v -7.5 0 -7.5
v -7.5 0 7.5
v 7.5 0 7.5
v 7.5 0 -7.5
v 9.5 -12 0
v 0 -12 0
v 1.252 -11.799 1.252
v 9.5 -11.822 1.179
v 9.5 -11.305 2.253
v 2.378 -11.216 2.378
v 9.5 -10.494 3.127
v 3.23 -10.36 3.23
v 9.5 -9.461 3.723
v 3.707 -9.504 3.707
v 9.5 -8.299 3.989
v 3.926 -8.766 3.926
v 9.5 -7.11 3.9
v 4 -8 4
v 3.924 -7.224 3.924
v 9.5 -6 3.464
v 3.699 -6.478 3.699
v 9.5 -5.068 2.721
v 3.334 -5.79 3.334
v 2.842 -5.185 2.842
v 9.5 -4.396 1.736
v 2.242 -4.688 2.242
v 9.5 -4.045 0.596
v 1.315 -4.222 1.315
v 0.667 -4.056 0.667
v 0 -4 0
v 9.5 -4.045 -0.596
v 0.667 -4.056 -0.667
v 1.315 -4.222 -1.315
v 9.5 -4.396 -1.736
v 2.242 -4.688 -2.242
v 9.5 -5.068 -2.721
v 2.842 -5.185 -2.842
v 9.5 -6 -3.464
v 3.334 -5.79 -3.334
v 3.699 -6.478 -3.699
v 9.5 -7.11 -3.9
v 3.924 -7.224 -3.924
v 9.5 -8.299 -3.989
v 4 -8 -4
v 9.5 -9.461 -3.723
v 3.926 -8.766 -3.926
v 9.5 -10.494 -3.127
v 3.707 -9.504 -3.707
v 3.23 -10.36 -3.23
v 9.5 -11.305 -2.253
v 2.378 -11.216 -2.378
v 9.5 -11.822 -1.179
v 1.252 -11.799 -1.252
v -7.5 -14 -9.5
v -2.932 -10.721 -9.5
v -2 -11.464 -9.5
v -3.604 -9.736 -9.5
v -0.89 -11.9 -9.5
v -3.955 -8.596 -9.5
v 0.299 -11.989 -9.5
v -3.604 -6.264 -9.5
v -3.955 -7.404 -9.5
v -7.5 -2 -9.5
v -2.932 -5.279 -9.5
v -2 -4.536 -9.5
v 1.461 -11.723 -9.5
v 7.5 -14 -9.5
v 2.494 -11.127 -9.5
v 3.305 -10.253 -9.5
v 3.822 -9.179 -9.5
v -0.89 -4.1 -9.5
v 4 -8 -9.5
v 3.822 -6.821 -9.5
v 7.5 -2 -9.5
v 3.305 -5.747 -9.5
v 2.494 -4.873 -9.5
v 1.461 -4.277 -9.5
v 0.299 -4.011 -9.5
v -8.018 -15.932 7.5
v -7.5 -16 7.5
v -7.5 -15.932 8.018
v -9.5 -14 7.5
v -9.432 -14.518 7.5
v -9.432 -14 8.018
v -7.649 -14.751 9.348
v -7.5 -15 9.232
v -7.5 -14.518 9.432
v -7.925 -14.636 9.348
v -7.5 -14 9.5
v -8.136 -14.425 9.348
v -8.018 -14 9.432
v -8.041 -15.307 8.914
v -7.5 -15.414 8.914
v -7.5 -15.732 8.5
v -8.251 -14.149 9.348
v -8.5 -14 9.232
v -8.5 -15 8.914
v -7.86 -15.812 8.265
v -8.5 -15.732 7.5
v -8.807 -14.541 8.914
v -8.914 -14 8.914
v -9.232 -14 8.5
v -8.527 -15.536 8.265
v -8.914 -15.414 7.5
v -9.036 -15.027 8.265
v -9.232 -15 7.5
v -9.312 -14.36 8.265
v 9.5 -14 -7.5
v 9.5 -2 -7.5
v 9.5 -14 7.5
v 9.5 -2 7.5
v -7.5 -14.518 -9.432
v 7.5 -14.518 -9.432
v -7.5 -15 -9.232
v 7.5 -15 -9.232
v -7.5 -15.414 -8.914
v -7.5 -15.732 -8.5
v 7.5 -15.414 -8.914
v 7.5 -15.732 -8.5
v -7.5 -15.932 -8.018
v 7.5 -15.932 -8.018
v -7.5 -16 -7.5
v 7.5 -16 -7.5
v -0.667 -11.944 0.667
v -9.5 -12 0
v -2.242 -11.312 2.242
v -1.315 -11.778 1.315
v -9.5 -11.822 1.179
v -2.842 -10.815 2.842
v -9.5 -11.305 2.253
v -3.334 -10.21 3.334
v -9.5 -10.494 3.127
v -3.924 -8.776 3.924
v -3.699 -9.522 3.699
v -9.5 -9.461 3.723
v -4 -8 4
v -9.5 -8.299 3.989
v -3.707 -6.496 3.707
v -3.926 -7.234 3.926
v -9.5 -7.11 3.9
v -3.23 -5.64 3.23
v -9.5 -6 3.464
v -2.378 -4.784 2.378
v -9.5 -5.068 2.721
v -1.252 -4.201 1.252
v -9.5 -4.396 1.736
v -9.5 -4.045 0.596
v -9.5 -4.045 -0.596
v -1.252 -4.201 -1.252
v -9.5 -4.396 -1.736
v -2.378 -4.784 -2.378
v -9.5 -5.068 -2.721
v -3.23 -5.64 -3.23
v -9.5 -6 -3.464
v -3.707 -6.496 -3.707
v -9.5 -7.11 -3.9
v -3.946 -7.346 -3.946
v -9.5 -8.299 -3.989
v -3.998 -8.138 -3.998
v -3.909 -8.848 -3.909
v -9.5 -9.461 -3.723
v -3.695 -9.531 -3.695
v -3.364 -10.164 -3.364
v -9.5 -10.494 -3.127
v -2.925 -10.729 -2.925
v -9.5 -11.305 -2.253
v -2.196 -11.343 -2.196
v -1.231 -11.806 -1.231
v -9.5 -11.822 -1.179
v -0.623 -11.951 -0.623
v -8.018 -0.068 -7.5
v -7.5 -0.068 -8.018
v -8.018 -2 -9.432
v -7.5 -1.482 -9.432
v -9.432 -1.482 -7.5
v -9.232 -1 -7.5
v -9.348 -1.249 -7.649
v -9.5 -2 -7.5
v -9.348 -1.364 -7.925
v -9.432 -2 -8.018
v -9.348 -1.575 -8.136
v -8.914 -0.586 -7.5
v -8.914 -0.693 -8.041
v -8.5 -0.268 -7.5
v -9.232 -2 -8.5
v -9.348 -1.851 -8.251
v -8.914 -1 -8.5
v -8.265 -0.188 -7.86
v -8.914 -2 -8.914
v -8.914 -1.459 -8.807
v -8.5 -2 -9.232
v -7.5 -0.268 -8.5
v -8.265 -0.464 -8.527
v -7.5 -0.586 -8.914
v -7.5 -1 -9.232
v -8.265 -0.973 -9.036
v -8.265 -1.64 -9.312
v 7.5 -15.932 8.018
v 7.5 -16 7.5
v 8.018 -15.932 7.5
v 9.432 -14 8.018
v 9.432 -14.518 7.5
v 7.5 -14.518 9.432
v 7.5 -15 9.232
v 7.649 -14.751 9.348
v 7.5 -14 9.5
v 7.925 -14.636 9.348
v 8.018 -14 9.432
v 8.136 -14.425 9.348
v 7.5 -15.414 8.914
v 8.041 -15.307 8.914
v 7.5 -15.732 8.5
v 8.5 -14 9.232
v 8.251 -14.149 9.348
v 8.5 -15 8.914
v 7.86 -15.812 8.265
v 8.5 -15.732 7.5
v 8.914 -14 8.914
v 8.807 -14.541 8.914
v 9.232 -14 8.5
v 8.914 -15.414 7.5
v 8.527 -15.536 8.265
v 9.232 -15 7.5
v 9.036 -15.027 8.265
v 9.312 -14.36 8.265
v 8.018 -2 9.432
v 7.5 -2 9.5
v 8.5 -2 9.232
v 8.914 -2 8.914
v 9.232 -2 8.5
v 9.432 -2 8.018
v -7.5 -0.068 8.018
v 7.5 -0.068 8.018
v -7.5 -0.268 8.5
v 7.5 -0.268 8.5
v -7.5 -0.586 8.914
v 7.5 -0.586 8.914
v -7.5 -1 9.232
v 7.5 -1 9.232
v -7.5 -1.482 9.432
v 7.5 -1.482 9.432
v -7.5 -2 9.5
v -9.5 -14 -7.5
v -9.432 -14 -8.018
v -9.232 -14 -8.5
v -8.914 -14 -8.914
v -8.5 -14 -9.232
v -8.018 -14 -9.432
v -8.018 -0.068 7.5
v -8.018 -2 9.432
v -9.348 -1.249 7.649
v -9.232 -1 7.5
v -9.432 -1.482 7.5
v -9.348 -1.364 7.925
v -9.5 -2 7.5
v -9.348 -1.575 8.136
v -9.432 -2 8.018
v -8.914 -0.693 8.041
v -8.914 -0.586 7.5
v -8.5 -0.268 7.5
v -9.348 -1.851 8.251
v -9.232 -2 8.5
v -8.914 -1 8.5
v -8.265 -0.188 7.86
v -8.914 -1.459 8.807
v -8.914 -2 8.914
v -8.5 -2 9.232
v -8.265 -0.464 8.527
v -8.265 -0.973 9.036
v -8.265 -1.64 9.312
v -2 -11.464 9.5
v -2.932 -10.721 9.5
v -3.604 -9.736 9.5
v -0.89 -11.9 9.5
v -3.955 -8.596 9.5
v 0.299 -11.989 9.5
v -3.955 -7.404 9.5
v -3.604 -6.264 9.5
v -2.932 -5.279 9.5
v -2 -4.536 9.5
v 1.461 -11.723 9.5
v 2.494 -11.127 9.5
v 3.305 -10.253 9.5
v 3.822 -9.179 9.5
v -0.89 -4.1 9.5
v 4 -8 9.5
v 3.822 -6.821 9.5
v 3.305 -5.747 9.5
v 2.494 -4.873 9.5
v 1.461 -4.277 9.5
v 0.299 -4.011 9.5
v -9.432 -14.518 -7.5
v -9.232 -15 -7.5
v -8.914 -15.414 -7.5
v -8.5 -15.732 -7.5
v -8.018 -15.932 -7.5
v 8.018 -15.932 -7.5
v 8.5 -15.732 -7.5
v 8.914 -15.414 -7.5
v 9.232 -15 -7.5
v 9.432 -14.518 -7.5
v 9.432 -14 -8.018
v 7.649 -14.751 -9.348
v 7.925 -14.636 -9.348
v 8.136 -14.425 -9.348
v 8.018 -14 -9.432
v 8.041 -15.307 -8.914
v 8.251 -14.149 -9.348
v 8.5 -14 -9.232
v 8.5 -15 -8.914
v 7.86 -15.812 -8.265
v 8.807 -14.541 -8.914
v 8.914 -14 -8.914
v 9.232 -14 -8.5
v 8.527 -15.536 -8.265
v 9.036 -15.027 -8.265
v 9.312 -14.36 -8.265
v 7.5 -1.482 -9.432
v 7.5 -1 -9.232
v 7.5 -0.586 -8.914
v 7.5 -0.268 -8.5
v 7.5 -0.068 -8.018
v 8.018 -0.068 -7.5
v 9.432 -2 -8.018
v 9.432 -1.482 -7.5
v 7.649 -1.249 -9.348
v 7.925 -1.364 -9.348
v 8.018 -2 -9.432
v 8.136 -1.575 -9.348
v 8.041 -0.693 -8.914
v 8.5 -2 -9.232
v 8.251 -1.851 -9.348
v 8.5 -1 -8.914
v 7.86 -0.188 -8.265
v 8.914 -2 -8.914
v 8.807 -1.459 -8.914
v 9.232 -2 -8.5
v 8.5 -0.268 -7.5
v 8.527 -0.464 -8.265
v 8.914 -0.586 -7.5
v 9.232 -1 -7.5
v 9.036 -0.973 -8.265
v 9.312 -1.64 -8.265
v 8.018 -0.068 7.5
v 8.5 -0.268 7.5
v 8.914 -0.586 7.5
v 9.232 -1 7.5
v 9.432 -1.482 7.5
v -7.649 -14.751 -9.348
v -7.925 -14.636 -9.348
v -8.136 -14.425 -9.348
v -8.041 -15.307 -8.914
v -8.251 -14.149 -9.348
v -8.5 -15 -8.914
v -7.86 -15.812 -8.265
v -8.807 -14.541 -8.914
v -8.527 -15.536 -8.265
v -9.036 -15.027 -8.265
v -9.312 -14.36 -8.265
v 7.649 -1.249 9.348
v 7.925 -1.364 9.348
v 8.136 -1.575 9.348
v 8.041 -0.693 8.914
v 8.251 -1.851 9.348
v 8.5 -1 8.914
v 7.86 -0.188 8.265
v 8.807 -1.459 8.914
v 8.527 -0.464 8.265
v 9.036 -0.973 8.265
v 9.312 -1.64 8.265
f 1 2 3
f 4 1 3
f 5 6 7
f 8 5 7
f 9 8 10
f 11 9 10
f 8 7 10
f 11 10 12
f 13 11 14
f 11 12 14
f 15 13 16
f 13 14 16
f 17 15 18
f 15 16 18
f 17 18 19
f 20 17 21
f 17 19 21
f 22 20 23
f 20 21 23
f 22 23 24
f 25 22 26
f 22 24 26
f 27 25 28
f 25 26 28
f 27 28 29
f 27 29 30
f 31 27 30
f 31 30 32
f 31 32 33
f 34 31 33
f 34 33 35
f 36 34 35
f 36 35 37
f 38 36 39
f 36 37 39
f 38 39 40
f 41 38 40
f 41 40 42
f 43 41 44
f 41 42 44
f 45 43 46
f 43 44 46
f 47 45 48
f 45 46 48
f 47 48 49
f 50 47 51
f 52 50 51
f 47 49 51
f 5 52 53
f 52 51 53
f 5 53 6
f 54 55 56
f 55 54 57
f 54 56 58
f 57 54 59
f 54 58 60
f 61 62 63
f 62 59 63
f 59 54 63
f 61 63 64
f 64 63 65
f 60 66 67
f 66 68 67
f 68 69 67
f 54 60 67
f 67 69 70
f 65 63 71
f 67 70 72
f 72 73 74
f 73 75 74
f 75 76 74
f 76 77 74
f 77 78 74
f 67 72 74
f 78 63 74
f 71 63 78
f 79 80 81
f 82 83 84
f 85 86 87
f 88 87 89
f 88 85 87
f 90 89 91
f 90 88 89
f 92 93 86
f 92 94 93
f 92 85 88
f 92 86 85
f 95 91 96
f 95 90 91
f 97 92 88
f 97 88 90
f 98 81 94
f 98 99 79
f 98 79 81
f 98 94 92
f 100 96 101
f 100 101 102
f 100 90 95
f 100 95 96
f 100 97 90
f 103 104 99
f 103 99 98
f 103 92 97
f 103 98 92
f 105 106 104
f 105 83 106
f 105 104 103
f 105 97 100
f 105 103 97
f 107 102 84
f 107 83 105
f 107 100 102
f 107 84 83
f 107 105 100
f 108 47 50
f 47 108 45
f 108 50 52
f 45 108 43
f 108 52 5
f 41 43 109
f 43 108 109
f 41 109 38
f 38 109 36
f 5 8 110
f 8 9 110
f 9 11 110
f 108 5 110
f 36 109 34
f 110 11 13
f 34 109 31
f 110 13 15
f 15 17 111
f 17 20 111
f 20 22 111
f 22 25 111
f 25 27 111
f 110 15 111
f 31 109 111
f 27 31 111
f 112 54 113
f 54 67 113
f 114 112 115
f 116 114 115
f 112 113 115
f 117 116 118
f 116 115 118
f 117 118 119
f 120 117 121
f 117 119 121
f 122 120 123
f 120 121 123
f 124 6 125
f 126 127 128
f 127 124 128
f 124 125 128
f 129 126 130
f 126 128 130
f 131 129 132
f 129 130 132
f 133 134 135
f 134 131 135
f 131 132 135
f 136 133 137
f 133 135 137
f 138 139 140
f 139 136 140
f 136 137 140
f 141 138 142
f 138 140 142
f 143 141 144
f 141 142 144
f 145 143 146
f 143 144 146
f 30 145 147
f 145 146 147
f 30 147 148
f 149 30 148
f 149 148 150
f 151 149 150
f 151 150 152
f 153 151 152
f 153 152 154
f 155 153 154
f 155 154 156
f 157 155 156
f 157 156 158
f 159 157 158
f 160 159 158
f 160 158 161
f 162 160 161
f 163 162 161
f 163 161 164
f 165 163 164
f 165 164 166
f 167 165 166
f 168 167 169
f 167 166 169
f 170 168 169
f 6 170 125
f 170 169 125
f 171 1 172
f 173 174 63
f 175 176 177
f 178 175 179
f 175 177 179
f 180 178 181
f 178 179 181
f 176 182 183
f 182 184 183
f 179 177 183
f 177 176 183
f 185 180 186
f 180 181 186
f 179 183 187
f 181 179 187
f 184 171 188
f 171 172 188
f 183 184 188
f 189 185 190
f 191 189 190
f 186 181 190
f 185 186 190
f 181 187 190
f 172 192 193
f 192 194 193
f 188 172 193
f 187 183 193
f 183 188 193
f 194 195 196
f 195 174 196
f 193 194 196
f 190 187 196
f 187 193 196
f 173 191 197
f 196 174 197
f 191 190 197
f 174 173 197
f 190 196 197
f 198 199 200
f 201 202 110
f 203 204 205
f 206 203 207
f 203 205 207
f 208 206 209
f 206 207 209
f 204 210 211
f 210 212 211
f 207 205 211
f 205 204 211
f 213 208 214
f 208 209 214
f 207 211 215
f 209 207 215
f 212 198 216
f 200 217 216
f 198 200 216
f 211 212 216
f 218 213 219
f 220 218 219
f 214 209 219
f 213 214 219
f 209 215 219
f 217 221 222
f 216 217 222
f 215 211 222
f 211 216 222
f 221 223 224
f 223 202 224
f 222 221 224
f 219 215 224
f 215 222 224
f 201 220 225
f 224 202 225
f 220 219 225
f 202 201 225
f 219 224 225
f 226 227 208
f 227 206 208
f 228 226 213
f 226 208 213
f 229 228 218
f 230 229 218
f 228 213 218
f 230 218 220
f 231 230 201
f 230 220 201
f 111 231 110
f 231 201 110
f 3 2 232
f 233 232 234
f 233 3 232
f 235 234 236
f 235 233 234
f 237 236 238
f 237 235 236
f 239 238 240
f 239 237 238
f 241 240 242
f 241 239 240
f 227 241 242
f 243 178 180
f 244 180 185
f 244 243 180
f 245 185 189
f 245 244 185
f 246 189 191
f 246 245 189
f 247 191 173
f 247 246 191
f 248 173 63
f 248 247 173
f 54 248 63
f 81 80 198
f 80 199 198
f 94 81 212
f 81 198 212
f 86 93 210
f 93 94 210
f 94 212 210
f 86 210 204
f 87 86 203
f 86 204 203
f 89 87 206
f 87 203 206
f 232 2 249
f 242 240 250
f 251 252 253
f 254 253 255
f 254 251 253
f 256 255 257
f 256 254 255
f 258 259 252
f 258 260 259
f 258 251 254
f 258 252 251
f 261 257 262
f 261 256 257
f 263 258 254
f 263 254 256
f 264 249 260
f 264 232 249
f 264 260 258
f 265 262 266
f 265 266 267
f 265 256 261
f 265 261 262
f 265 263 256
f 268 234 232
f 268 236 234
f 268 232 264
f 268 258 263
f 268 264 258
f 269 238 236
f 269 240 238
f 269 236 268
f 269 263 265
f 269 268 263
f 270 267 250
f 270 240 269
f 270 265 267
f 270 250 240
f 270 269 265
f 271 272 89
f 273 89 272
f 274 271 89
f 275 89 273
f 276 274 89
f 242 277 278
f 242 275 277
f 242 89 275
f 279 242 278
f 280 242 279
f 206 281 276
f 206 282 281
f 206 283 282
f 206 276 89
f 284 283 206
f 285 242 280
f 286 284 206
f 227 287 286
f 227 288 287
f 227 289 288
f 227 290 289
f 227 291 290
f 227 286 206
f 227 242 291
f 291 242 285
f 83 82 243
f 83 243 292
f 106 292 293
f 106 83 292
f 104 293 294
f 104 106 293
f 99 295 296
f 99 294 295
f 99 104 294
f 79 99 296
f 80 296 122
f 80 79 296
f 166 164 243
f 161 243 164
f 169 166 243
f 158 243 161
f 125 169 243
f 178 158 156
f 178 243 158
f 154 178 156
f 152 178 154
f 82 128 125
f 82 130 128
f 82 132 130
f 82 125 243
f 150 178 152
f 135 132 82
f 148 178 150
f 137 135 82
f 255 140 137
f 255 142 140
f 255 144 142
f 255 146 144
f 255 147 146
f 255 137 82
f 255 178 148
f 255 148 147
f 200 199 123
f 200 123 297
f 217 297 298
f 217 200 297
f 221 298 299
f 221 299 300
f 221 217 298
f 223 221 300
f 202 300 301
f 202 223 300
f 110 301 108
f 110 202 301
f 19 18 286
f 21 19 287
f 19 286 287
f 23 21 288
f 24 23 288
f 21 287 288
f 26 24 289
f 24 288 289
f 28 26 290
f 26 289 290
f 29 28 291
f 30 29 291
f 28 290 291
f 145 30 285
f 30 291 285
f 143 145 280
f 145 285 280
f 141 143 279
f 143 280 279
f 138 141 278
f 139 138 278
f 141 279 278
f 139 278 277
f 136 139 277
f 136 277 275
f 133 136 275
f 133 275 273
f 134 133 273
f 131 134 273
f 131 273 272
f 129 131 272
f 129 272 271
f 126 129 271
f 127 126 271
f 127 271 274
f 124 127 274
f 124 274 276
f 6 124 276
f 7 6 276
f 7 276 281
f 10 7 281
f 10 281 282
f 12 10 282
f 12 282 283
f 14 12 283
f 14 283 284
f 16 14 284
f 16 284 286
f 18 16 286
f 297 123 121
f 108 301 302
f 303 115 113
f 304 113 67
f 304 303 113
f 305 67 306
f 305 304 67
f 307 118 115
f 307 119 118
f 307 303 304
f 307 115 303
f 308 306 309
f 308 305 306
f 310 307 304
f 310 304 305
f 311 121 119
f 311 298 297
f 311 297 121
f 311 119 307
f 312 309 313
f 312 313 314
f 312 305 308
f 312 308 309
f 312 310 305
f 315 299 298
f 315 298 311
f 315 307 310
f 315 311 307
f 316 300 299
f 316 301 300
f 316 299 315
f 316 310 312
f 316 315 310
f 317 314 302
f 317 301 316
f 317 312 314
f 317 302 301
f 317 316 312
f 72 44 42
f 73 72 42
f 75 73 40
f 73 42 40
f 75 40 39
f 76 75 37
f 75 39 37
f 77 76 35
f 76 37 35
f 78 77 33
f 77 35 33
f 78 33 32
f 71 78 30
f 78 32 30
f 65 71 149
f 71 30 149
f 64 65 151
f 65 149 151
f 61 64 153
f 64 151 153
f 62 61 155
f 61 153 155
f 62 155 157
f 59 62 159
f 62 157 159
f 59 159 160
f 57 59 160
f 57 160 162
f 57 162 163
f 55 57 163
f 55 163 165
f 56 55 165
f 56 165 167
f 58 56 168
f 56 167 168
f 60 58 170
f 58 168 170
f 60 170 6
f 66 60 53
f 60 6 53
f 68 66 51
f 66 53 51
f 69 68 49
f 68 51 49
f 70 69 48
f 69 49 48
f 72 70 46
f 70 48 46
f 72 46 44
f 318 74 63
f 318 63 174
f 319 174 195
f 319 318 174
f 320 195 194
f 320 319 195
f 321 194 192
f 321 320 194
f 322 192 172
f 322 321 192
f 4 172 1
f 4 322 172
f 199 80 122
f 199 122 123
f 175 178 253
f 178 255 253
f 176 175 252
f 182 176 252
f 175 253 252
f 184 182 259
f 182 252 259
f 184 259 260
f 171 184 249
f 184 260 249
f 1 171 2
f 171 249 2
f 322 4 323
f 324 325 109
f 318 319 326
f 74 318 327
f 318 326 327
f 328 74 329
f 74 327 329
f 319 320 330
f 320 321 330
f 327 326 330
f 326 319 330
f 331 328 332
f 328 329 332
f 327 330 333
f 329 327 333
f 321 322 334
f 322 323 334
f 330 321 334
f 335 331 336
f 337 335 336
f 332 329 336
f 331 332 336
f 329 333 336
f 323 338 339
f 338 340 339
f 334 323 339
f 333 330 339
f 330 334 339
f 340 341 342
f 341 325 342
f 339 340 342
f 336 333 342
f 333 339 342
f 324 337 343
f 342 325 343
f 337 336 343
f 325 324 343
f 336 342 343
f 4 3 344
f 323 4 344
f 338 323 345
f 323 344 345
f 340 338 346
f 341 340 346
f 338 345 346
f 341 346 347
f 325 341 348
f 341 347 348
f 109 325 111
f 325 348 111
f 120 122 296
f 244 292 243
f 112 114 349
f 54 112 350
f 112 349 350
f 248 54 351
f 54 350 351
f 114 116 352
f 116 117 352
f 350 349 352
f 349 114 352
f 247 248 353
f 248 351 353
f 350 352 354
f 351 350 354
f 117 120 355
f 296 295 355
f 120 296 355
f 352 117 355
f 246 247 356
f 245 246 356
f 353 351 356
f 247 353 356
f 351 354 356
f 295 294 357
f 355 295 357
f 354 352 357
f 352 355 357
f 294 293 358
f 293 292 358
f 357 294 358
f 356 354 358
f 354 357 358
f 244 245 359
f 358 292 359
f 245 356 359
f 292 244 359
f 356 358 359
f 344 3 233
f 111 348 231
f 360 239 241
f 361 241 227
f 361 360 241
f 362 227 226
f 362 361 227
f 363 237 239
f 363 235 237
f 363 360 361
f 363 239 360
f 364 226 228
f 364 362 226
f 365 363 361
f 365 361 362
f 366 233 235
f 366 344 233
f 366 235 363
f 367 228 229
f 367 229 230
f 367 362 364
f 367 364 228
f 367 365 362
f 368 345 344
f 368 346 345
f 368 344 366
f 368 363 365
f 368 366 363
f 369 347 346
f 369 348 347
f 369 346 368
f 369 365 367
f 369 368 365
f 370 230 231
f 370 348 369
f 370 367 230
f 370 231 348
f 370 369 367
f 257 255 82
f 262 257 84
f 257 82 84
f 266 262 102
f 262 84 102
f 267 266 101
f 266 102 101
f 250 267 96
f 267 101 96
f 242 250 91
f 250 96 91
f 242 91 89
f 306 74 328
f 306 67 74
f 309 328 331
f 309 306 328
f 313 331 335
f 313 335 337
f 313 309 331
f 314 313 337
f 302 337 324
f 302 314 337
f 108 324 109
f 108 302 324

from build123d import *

# Parameters (mm, degrees)
F0_W     = 19
F0_H     = 19
F1_DEPTH = 16
F2_R     = 4
F3_DEPTH = 19
F4_R     = 4
F5_DEPTH = 19
F6_R     = 2


with BuildPart() as f1:
    # F0 (on Front) → F1 (new body)
    with BuildSketch(Plane.XZ):
        Rectangle(F0_W, F0_H)
    extrude(amount=F1_DEPTH)

    # F2 (on face) → F3 (cut)
    with BuildSketch(Plane.XY.offset(9.5)):
        with Locations((0, -8)):
            Circle(F2_R)
    extrude(amount=-F3_DEPTH, mode=Mode.SUBTRACT)

    # F4 (on face) → F5 (cut)
    with BuildSketch(Plane(origin=(-9.5, 0, 0), x_dir=(0, -1, 0), z_dir=(-1, 0, 0))):
        with Locations((8, 0)):
            Circle(F4_R)
    extrude(amount=-F5_DEPTH, mode=Mode.SUBTRACT)

    # F6
    f6_edges = [f1.edges().sort_by_distance(p)[0] for p in [
        (9.5, 0, 0),
        (0, 0, 9.5),
        (0, 0, -9.5),
        (-9.5, 0, 0),
        (-9.5, -16, 0),
        (9.5, -16, 0),
        (0, -16, -9.5),
        (0, -16, 9.5),
        (-9.5, -8, -9.5),
        (9.5, -8, -9.5),
        (9.5, -8, 9.5),
        (-9.5, -8, 9.5),
    ]]
    fillet(f6_edges, radius=F6_R)


solid = f1.part
